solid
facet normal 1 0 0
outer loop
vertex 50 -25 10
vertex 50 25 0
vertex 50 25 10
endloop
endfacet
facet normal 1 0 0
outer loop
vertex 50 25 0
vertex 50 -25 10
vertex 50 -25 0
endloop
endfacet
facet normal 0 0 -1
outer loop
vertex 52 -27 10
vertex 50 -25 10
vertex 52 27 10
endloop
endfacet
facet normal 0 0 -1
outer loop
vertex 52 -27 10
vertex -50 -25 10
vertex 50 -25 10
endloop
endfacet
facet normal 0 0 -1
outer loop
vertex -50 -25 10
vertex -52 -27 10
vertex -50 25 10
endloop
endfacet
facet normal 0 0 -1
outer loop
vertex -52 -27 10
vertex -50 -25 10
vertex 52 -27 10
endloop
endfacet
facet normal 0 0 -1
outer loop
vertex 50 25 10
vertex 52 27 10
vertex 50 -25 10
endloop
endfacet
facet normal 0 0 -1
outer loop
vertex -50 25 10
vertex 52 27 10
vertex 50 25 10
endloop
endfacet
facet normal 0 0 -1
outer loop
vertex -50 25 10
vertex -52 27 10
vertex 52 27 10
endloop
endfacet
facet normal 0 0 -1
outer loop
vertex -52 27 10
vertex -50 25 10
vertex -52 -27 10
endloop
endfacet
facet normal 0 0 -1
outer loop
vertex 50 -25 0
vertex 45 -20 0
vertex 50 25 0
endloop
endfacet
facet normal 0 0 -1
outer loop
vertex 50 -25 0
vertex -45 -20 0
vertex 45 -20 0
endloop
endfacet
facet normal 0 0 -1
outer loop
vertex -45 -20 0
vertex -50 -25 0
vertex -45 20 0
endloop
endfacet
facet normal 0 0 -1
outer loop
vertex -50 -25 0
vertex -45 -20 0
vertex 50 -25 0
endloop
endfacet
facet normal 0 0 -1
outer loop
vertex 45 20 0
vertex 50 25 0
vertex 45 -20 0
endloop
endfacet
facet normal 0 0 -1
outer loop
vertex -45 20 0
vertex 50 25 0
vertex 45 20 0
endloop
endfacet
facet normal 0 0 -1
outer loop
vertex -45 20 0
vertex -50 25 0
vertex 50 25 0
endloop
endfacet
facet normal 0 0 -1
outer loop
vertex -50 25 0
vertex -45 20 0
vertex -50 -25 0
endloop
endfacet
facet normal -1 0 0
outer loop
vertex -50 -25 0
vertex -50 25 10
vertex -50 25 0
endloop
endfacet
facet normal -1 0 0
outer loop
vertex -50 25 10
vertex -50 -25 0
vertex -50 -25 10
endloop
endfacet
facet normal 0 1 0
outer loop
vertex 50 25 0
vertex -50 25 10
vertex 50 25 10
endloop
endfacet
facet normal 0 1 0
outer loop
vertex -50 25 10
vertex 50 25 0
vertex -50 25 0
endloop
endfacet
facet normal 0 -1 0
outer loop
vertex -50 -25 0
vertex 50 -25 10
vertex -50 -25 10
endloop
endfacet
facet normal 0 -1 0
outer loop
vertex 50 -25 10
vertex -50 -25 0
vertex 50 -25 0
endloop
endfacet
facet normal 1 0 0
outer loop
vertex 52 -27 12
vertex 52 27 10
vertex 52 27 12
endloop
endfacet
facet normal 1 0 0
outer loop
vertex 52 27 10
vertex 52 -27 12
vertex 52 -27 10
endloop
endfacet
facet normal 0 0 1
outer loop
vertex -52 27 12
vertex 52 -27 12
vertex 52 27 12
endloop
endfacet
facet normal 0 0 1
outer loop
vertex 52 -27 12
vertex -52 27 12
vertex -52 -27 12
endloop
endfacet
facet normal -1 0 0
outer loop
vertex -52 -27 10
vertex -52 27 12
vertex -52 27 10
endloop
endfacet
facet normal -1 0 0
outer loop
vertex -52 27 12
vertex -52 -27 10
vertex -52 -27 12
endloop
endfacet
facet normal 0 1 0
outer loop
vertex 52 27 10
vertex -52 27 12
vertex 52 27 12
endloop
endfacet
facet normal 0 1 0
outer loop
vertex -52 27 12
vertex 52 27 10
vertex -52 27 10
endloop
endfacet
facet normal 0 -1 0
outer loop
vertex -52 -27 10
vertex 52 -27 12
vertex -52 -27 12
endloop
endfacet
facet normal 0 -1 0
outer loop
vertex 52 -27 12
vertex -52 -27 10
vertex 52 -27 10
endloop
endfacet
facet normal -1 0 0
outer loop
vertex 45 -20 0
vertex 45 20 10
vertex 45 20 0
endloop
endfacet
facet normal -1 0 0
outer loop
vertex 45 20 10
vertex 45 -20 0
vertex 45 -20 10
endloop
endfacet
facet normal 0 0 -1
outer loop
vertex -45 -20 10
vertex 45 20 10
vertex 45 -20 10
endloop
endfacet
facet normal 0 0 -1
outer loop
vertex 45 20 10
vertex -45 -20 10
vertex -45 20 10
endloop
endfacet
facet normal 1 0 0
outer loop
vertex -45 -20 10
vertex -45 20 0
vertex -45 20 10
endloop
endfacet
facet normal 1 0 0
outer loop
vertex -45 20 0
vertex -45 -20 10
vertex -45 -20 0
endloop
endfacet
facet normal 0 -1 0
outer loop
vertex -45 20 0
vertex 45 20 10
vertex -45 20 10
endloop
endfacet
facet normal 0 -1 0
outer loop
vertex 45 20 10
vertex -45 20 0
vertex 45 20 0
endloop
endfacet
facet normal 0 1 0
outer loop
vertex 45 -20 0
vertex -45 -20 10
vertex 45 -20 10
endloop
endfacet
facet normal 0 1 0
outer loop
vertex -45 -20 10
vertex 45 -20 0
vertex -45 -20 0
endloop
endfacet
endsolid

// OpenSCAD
module tray_housing() {
    difference() {
        // Outer shape with chamfered sides and overhanging flange
        union() {
            // Main body
            translate([-50, -25, 0])
                scale([1, 1, 0.5])
                    cube([100, 50, 20], center=false);
            // Overhanging flange
            translate([-52, -27, 10])
                cube([104, 54, 2], center=false);
        }
        // Recessed central panel
        translate([-45, -20, 0])
            cube([90, 40, 10], center=false);
        // Long narrow slot
        translate([-20, -2, 0])
            cube([40, 4, 10], center=false);
    }
}

tray_housing();
